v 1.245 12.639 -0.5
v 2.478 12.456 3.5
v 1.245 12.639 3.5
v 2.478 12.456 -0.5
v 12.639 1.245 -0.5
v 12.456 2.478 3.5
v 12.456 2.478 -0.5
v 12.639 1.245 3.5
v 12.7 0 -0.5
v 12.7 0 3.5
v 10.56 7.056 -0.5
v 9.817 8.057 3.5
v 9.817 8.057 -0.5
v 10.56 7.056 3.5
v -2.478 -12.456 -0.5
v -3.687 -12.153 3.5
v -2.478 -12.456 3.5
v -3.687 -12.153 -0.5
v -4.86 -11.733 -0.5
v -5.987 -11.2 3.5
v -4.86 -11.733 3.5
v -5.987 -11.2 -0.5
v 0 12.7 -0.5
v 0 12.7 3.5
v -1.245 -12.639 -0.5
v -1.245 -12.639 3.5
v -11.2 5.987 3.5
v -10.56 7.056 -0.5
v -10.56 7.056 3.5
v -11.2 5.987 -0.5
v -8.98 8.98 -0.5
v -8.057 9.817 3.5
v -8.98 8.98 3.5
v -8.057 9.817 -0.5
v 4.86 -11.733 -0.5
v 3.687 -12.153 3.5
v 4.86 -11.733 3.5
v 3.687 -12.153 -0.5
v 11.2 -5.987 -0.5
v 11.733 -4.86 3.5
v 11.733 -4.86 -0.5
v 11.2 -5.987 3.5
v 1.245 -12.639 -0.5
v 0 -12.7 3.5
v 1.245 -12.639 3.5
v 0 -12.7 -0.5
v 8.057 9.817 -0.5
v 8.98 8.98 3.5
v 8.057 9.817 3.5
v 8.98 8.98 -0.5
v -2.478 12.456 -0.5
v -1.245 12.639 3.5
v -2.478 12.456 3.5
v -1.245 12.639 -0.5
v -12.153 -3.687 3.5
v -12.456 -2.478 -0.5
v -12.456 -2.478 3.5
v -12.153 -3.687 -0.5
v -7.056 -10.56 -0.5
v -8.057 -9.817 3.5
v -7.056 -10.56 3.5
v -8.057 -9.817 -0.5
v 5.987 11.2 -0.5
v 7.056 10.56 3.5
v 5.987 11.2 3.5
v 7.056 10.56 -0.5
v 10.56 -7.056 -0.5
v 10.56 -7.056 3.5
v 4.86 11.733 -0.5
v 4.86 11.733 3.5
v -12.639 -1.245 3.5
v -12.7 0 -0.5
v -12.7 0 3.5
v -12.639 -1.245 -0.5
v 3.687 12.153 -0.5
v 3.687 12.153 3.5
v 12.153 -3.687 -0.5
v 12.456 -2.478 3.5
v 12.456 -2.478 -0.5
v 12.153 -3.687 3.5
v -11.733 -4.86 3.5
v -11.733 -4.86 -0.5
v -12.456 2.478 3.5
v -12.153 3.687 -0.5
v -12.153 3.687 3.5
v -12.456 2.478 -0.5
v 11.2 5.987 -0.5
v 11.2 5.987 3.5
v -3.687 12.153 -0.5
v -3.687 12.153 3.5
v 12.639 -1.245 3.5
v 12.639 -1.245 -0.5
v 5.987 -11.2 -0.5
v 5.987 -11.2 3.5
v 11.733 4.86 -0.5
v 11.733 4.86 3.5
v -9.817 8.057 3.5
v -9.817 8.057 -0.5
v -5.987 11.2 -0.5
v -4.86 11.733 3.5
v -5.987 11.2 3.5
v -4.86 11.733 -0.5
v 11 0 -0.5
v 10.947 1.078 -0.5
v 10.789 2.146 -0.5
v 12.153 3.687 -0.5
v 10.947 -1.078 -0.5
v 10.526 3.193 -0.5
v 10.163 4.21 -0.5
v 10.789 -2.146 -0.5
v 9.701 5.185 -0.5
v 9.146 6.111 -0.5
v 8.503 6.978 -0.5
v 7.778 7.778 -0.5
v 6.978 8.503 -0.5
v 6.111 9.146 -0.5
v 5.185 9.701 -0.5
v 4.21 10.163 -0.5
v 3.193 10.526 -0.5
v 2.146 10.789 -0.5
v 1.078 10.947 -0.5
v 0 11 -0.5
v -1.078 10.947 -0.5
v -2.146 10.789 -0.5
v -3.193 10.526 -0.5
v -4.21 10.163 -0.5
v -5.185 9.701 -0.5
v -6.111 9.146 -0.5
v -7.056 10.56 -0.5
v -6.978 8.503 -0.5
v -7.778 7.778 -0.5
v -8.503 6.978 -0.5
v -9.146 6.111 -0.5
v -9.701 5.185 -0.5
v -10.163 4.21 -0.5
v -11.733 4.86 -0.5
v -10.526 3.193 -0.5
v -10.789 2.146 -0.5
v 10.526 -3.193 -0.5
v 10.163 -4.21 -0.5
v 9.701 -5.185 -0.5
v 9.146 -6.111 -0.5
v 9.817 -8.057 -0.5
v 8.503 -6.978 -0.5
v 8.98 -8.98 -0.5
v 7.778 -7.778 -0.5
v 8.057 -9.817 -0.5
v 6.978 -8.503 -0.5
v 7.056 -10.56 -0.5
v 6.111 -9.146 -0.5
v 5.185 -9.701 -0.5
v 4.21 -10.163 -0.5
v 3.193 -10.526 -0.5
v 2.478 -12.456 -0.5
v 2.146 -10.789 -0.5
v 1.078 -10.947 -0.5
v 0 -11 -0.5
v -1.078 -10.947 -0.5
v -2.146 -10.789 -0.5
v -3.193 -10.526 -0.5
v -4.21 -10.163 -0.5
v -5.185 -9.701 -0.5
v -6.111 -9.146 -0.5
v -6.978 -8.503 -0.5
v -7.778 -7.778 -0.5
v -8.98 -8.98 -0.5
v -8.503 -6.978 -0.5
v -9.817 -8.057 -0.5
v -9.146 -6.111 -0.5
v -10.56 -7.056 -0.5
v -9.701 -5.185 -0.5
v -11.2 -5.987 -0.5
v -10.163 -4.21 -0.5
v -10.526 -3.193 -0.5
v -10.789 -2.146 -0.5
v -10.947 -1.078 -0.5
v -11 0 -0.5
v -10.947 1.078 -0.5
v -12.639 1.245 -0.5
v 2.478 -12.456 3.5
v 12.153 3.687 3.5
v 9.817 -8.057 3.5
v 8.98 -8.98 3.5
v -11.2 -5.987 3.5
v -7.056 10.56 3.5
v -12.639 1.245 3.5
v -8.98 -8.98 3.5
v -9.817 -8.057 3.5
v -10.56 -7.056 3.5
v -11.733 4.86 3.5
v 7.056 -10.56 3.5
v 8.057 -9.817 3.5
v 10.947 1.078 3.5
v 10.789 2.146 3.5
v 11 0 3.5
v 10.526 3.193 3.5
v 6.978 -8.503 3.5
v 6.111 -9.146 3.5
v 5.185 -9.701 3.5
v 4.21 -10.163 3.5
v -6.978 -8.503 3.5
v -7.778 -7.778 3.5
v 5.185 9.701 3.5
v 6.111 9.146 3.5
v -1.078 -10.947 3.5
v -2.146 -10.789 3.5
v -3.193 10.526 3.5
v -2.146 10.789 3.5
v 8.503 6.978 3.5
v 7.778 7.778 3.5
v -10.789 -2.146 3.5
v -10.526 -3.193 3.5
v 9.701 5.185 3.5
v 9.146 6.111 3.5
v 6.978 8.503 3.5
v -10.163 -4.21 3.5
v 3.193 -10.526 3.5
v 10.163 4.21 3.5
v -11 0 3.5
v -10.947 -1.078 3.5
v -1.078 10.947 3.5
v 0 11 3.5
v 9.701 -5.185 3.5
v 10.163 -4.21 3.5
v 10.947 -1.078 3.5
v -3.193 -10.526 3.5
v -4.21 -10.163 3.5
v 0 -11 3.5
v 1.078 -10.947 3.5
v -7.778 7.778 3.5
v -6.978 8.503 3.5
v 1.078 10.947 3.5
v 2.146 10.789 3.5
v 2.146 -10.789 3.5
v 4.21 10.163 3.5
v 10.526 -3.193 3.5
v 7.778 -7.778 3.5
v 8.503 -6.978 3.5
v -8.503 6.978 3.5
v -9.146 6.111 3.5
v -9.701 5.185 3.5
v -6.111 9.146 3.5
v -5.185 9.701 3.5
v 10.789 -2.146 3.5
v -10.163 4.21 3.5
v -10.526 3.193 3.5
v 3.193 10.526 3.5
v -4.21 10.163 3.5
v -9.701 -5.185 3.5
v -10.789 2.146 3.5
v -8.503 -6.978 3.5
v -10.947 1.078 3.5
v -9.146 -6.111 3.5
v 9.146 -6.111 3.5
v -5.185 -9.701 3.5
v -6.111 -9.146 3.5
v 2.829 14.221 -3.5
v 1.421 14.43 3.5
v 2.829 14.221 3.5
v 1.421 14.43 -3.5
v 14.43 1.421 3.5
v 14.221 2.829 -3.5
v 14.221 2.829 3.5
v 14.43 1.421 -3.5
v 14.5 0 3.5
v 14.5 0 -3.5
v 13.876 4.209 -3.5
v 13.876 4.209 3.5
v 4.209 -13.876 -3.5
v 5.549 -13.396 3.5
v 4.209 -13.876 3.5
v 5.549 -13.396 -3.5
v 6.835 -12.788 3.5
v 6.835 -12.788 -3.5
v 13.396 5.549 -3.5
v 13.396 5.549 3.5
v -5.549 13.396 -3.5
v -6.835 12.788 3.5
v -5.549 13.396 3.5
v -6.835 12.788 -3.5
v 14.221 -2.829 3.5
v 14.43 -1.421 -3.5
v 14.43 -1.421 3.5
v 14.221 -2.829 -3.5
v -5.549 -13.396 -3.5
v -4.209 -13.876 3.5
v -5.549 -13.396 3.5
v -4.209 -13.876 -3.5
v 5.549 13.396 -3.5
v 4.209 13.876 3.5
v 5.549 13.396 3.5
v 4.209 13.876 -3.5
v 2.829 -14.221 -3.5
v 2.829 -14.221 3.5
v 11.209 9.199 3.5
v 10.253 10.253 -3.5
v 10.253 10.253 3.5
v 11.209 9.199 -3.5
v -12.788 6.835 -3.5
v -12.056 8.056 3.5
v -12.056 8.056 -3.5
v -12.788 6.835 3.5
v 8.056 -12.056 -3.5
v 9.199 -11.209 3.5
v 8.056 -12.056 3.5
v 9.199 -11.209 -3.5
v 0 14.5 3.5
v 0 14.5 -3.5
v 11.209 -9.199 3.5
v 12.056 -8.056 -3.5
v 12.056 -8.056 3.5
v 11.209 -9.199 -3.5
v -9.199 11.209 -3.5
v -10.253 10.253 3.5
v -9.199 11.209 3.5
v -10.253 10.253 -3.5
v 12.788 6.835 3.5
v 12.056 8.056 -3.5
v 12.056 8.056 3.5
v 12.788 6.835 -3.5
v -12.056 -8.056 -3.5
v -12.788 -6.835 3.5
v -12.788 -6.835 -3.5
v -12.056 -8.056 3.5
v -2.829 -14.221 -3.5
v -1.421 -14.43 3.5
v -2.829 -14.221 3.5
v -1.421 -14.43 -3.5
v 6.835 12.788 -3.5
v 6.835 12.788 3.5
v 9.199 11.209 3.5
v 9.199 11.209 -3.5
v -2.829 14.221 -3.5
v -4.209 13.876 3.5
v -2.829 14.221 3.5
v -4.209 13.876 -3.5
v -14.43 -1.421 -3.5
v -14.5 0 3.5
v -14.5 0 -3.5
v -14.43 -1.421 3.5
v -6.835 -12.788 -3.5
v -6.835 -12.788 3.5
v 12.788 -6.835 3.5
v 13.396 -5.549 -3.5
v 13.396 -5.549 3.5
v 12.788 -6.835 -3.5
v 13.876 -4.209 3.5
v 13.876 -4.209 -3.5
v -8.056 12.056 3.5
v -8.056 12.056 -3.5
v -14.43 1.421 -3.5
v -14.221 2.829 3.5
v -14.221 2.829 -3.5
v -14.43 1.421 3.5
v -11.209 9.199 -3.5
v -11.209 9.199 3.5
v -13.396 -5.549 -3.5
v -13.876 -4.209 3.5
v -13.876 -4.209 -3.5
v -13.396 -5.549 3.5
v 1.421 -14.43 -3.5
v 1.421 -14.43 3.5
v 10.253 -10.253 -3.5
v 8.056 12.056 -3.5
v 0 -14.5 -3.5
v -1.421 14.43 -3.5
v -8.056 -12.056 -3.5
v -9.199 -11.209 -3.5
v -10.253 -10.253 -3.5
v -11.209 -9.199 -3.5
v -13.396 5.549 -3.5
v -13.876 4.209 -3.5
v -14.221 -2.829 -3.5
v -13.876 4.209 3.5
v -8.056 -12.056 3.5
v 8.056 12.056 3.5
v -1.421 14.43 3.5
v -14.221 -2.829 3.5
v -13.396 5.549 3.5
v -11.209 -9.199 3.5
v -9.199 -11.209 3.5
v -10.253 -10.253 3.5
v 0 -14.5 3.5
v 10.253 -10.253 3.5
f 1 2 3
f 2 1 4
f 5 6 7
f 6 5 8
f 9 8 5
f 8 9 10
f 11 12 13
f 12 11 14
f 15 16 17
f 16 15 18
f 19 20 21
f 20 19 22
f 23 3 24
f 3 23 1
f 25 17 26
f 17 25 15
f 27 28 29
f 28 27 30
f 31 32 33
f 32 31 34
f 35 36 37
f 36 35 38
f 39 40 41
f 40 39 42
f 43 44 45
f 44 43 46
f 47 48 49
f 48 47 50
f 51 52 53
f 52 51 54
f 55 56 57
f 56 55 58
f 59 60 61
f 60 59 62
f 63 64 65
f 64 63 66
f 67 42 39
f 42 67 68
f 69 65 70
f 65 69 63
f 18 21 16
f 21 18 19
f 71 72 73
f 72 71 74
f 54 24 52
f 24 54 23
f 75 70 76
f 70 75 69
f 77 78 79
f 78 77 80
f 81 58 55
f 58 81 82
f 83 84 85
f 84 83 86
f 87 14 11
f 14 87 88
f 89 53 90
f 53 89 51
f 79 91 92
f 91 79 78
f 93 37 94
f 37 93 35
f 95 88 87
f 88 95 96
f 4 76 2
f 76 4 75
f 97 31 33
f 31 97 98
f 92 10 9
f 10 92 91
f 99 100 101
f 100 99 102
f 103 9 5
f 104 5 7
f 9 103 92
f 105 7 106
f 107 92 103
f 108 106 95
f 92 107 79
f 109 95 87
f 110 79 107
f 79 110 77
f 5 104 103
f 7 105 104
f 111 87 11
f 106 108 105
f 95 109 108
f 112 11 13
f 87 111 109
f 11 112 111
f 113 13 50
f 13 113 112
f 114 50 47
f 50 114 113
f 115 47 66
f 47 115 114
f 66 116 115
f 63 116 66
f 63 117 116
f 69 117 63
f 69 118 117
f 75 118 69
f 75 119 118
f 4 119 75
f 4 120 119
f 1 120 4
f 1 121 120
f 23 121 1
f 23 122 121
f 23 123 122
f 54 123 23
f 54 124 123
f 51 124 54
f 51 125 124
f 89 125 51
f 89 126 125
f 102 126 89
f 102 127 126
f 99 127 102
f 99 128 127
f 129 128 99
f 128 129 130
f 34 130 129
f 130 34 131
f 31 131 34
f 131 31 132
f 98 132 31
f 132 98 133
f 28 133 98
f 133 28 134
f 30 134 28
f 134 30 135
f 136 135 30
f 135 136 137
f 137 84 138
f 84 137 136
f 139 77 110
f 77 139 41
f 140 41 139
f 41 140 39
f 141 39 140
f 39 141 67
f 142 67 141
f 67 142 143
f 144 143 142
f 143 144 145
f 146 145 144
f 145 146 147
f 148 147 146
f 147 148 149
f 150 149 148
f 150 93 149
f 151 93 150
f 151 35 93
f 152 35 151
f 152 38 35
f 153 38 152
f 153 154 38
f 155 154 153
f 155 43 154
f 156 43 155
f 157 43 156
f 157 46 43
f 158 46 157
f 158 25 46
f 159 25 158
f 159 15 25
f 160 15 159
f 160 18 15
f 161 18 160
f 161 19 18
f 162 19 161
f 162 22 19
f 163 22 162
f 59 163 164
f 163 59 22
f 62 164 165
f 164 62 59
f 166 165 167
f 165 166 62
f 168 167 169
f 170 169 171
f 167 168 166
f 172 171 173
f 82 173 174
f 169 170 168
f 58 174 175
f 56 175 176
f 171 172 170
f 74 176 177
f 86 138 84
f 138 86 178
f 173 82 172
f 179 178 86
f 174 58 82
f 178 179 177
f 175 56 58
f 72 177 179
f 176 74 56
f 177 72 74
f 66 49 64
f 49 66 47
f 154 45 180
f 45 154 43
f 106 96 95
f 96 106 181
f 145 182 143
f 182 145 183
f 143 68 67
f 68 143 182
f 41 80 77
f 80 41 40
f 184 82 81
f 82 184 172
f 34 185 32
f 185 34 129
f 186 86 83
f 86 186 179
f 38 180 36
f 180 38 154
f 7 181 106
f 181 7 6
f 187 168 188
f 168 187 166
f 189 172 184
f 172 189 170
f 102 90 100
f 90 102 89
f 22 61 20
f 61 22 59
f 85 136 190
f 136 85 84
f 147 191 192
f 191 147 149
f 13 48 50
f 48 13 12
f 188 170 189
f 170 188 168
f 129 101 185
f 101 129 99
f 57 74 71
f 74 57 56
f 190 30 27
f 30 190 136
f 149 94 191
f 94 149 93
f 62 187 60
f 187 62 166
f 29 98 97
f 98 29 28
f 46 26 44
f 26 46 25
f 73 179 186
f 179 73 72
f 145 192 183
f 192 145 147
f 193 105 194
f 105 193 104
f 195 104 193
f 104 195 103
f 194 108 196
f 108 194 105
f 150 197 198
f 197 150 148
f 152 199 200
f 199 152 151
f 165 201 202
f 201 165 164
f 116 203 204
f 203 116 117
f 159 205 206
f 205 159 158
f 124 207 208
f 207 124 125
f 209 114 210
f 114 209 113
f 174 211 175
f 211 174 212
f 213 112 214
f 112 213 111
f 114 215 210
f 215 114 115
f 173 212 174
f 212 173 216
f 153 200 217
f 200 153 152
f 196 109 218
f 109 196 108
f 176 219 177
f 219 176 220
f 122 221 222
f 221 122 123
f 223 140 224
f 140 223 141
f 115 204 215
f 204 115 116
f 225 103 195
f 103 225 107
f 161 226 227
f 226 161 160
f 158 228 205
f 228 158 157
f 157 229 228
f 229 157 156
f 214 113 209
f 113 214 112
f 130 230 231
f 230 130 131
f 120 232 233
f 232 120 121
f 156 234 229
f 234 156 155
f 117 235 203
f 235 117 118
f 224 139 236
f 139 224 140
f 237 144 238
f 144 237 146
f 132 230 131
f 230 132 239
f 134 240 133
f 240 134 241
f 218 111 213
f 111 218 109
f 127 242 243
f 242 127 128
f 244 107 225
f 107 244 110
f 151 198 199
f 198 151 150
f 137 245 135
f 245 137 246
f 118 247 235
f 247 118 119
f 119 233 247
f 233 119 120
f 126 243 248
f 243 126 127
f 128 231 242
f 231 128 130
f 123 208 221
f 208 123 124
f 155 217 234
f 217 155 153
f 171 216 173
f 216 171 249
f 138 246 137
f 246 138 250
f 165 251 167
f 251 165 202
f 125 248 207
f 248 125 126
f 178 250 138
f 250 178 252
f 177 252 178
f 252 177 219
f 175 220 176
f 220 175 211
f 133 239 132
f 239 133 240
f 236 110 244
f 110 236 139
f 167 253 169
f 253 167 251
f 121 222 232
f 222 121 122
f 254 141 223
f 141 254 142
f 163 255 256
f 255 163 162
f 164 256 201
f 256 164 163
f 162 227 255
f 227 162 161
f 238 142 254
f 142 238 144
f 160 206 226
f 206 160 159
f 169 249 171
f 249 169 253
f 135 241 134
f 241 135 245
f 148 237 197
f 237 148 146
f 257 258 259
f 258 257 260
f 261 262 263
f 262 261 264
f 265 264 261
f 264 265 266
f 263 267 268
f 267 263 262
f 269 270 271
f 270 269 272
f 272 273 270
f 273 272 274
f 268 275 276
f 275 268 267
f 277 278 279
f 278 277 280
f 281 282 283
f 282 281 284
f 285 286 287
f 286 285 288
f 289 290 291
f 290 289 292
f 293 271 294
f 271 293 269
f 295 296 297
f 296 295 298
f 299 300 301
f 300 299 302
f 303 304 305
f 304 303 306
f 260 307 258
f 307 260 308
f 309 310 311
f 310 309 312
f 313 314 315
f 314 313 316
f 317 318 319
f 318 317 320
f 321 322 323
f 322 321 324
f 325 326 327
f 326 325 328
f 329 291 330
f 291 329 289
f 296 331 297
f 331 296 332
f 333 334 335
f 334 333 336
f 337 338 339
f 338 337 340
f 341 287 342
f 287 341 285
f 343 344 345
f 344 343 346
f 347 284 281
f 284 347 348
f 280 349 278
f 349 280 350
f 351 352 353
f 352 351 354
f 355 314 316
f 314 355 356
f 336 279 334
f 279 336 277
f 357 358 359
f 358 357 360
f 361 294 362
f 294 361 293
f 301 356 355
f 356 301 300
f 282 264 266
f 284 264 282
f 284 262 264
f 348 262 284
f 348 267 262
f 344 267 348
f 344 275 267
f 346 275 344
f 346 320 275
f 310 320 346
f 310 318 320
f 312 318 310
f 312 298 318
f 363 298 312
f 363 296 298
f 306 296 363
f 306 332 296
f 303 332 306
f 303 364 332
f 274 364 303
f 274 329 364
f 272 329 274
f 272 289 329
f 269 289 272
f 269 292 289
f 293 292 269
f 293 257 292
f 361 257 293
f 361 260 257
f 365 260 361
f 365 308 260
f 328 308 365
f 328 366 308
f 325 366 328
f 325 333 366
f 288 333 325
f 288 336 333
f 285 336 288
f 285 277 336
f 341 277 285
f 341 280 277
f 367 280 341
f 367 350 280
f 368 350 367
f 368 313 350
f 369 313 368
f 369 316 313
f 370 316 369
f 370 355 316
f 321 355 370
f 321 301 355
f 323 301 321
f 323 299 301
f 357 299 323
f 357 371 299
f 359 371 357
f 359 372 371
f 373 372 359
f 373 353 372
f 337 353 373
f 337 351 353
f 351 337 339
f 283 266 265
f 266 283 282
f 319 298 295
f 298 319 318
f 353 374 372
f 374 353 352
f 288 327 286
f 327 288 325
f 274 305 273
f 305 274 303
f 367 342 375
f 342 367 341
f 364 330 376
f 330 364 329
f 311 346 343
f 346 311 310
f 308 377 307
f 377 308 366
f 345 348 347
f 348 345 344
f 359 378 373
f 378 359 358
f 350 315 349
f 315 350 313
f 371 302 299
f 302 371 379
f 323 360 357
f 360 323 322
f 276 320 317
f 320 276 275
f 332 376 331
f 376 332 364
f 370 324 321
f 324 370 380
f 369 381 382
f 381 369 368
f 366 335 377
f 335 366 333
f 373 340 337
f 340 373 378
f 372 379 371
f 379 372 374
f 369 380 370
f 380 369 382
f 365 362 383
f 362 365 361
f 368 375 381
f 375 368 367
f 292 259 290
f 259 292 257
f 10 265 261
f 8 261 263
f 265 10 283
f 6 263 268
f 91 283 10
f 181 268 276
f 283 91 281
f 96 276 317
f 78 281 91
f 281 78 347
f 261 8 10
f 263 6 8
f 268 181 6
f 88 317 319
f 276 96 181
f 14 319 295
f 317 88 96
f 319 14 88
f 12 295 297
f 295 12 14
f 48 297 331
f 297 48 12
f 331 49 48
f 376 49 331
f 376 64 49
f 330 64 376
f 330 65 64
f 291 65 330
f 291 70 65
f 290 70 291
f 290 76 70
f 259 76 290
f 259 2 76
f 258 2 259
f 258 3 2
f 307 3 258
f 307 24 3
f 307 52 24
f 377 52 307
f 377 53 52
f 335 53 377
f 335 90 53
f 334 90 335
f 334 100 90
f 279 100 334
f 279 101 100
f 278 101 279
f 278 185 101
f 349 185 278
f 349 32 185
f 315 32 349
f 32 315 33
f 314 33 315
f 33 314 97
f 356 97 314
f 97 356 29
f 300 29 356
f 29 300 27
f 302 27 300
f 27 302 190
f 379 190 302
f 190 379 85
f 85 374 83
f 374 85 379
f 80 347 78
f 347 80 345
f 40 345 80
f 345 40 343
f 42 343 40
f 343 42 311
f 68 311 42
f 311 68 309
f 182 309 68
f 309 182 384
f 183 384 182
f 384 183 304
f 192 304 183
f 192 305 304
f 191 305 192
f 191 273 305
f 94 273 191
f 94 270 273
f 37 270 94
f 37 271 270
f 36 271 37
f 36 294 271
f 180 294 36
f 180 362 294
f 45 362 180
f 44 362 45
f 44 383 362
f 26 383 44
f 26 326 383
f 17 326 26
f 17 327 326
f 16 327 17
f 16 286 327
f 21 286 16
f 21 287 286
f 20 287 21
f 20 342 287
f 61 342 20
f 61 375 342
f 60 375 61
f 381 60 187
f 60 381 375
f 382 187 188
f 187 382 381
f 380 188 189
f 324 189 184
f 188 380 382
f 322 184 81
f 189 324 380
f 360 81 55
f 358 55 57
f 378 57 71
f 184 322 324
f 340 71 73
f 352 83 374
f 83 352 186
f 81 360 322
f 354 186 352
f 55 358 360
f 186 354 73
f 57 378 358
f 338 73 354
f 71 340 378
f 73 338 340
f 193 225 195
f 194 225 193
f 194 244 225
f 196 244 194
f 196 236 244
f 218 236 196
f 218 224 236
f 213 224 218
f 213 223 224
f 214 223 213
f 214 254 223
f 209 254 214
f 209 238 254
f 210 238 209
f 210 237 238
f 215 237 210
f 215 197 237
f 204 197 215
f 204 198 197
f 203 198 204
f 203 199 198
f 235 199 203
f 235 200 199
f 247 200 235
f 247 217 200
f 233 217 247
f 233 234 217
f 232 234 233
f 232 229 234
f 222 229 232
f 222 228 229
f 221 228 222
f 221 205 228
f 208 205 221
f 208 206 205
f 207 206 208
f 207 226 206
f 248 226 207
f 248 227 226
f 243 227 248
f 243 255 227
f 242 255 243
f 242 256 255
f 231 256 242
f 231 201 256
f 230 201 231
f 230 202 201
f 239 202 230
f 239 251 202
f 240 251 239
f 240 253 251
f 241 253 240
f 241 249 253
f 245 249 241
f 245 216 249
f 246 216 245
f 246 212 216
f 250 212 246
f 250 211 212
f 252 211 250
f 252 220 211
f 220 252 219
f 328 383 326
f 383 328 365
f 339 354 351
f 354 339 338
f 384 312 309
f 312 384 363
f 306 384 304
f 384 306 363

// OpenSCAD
// model the candy cane tube
module tube(height=5)
{
  difference()
  {
    cylinder(h=height, d=25.4, center=true, $fn=64);
    cylinder(h=height, d=22, center=true, $fn=64);
  }
}

module sleeve(depth=5, sleeve_d=29)
{
  floor_thickness = 2;
  difference()
  {
    cylinder(d=sleeve_d,h=depth+floor_thickness, center=true, $fn=64);
    translate([0,0,floor_thickness])tube(depth);
  }
}

sleeve();
